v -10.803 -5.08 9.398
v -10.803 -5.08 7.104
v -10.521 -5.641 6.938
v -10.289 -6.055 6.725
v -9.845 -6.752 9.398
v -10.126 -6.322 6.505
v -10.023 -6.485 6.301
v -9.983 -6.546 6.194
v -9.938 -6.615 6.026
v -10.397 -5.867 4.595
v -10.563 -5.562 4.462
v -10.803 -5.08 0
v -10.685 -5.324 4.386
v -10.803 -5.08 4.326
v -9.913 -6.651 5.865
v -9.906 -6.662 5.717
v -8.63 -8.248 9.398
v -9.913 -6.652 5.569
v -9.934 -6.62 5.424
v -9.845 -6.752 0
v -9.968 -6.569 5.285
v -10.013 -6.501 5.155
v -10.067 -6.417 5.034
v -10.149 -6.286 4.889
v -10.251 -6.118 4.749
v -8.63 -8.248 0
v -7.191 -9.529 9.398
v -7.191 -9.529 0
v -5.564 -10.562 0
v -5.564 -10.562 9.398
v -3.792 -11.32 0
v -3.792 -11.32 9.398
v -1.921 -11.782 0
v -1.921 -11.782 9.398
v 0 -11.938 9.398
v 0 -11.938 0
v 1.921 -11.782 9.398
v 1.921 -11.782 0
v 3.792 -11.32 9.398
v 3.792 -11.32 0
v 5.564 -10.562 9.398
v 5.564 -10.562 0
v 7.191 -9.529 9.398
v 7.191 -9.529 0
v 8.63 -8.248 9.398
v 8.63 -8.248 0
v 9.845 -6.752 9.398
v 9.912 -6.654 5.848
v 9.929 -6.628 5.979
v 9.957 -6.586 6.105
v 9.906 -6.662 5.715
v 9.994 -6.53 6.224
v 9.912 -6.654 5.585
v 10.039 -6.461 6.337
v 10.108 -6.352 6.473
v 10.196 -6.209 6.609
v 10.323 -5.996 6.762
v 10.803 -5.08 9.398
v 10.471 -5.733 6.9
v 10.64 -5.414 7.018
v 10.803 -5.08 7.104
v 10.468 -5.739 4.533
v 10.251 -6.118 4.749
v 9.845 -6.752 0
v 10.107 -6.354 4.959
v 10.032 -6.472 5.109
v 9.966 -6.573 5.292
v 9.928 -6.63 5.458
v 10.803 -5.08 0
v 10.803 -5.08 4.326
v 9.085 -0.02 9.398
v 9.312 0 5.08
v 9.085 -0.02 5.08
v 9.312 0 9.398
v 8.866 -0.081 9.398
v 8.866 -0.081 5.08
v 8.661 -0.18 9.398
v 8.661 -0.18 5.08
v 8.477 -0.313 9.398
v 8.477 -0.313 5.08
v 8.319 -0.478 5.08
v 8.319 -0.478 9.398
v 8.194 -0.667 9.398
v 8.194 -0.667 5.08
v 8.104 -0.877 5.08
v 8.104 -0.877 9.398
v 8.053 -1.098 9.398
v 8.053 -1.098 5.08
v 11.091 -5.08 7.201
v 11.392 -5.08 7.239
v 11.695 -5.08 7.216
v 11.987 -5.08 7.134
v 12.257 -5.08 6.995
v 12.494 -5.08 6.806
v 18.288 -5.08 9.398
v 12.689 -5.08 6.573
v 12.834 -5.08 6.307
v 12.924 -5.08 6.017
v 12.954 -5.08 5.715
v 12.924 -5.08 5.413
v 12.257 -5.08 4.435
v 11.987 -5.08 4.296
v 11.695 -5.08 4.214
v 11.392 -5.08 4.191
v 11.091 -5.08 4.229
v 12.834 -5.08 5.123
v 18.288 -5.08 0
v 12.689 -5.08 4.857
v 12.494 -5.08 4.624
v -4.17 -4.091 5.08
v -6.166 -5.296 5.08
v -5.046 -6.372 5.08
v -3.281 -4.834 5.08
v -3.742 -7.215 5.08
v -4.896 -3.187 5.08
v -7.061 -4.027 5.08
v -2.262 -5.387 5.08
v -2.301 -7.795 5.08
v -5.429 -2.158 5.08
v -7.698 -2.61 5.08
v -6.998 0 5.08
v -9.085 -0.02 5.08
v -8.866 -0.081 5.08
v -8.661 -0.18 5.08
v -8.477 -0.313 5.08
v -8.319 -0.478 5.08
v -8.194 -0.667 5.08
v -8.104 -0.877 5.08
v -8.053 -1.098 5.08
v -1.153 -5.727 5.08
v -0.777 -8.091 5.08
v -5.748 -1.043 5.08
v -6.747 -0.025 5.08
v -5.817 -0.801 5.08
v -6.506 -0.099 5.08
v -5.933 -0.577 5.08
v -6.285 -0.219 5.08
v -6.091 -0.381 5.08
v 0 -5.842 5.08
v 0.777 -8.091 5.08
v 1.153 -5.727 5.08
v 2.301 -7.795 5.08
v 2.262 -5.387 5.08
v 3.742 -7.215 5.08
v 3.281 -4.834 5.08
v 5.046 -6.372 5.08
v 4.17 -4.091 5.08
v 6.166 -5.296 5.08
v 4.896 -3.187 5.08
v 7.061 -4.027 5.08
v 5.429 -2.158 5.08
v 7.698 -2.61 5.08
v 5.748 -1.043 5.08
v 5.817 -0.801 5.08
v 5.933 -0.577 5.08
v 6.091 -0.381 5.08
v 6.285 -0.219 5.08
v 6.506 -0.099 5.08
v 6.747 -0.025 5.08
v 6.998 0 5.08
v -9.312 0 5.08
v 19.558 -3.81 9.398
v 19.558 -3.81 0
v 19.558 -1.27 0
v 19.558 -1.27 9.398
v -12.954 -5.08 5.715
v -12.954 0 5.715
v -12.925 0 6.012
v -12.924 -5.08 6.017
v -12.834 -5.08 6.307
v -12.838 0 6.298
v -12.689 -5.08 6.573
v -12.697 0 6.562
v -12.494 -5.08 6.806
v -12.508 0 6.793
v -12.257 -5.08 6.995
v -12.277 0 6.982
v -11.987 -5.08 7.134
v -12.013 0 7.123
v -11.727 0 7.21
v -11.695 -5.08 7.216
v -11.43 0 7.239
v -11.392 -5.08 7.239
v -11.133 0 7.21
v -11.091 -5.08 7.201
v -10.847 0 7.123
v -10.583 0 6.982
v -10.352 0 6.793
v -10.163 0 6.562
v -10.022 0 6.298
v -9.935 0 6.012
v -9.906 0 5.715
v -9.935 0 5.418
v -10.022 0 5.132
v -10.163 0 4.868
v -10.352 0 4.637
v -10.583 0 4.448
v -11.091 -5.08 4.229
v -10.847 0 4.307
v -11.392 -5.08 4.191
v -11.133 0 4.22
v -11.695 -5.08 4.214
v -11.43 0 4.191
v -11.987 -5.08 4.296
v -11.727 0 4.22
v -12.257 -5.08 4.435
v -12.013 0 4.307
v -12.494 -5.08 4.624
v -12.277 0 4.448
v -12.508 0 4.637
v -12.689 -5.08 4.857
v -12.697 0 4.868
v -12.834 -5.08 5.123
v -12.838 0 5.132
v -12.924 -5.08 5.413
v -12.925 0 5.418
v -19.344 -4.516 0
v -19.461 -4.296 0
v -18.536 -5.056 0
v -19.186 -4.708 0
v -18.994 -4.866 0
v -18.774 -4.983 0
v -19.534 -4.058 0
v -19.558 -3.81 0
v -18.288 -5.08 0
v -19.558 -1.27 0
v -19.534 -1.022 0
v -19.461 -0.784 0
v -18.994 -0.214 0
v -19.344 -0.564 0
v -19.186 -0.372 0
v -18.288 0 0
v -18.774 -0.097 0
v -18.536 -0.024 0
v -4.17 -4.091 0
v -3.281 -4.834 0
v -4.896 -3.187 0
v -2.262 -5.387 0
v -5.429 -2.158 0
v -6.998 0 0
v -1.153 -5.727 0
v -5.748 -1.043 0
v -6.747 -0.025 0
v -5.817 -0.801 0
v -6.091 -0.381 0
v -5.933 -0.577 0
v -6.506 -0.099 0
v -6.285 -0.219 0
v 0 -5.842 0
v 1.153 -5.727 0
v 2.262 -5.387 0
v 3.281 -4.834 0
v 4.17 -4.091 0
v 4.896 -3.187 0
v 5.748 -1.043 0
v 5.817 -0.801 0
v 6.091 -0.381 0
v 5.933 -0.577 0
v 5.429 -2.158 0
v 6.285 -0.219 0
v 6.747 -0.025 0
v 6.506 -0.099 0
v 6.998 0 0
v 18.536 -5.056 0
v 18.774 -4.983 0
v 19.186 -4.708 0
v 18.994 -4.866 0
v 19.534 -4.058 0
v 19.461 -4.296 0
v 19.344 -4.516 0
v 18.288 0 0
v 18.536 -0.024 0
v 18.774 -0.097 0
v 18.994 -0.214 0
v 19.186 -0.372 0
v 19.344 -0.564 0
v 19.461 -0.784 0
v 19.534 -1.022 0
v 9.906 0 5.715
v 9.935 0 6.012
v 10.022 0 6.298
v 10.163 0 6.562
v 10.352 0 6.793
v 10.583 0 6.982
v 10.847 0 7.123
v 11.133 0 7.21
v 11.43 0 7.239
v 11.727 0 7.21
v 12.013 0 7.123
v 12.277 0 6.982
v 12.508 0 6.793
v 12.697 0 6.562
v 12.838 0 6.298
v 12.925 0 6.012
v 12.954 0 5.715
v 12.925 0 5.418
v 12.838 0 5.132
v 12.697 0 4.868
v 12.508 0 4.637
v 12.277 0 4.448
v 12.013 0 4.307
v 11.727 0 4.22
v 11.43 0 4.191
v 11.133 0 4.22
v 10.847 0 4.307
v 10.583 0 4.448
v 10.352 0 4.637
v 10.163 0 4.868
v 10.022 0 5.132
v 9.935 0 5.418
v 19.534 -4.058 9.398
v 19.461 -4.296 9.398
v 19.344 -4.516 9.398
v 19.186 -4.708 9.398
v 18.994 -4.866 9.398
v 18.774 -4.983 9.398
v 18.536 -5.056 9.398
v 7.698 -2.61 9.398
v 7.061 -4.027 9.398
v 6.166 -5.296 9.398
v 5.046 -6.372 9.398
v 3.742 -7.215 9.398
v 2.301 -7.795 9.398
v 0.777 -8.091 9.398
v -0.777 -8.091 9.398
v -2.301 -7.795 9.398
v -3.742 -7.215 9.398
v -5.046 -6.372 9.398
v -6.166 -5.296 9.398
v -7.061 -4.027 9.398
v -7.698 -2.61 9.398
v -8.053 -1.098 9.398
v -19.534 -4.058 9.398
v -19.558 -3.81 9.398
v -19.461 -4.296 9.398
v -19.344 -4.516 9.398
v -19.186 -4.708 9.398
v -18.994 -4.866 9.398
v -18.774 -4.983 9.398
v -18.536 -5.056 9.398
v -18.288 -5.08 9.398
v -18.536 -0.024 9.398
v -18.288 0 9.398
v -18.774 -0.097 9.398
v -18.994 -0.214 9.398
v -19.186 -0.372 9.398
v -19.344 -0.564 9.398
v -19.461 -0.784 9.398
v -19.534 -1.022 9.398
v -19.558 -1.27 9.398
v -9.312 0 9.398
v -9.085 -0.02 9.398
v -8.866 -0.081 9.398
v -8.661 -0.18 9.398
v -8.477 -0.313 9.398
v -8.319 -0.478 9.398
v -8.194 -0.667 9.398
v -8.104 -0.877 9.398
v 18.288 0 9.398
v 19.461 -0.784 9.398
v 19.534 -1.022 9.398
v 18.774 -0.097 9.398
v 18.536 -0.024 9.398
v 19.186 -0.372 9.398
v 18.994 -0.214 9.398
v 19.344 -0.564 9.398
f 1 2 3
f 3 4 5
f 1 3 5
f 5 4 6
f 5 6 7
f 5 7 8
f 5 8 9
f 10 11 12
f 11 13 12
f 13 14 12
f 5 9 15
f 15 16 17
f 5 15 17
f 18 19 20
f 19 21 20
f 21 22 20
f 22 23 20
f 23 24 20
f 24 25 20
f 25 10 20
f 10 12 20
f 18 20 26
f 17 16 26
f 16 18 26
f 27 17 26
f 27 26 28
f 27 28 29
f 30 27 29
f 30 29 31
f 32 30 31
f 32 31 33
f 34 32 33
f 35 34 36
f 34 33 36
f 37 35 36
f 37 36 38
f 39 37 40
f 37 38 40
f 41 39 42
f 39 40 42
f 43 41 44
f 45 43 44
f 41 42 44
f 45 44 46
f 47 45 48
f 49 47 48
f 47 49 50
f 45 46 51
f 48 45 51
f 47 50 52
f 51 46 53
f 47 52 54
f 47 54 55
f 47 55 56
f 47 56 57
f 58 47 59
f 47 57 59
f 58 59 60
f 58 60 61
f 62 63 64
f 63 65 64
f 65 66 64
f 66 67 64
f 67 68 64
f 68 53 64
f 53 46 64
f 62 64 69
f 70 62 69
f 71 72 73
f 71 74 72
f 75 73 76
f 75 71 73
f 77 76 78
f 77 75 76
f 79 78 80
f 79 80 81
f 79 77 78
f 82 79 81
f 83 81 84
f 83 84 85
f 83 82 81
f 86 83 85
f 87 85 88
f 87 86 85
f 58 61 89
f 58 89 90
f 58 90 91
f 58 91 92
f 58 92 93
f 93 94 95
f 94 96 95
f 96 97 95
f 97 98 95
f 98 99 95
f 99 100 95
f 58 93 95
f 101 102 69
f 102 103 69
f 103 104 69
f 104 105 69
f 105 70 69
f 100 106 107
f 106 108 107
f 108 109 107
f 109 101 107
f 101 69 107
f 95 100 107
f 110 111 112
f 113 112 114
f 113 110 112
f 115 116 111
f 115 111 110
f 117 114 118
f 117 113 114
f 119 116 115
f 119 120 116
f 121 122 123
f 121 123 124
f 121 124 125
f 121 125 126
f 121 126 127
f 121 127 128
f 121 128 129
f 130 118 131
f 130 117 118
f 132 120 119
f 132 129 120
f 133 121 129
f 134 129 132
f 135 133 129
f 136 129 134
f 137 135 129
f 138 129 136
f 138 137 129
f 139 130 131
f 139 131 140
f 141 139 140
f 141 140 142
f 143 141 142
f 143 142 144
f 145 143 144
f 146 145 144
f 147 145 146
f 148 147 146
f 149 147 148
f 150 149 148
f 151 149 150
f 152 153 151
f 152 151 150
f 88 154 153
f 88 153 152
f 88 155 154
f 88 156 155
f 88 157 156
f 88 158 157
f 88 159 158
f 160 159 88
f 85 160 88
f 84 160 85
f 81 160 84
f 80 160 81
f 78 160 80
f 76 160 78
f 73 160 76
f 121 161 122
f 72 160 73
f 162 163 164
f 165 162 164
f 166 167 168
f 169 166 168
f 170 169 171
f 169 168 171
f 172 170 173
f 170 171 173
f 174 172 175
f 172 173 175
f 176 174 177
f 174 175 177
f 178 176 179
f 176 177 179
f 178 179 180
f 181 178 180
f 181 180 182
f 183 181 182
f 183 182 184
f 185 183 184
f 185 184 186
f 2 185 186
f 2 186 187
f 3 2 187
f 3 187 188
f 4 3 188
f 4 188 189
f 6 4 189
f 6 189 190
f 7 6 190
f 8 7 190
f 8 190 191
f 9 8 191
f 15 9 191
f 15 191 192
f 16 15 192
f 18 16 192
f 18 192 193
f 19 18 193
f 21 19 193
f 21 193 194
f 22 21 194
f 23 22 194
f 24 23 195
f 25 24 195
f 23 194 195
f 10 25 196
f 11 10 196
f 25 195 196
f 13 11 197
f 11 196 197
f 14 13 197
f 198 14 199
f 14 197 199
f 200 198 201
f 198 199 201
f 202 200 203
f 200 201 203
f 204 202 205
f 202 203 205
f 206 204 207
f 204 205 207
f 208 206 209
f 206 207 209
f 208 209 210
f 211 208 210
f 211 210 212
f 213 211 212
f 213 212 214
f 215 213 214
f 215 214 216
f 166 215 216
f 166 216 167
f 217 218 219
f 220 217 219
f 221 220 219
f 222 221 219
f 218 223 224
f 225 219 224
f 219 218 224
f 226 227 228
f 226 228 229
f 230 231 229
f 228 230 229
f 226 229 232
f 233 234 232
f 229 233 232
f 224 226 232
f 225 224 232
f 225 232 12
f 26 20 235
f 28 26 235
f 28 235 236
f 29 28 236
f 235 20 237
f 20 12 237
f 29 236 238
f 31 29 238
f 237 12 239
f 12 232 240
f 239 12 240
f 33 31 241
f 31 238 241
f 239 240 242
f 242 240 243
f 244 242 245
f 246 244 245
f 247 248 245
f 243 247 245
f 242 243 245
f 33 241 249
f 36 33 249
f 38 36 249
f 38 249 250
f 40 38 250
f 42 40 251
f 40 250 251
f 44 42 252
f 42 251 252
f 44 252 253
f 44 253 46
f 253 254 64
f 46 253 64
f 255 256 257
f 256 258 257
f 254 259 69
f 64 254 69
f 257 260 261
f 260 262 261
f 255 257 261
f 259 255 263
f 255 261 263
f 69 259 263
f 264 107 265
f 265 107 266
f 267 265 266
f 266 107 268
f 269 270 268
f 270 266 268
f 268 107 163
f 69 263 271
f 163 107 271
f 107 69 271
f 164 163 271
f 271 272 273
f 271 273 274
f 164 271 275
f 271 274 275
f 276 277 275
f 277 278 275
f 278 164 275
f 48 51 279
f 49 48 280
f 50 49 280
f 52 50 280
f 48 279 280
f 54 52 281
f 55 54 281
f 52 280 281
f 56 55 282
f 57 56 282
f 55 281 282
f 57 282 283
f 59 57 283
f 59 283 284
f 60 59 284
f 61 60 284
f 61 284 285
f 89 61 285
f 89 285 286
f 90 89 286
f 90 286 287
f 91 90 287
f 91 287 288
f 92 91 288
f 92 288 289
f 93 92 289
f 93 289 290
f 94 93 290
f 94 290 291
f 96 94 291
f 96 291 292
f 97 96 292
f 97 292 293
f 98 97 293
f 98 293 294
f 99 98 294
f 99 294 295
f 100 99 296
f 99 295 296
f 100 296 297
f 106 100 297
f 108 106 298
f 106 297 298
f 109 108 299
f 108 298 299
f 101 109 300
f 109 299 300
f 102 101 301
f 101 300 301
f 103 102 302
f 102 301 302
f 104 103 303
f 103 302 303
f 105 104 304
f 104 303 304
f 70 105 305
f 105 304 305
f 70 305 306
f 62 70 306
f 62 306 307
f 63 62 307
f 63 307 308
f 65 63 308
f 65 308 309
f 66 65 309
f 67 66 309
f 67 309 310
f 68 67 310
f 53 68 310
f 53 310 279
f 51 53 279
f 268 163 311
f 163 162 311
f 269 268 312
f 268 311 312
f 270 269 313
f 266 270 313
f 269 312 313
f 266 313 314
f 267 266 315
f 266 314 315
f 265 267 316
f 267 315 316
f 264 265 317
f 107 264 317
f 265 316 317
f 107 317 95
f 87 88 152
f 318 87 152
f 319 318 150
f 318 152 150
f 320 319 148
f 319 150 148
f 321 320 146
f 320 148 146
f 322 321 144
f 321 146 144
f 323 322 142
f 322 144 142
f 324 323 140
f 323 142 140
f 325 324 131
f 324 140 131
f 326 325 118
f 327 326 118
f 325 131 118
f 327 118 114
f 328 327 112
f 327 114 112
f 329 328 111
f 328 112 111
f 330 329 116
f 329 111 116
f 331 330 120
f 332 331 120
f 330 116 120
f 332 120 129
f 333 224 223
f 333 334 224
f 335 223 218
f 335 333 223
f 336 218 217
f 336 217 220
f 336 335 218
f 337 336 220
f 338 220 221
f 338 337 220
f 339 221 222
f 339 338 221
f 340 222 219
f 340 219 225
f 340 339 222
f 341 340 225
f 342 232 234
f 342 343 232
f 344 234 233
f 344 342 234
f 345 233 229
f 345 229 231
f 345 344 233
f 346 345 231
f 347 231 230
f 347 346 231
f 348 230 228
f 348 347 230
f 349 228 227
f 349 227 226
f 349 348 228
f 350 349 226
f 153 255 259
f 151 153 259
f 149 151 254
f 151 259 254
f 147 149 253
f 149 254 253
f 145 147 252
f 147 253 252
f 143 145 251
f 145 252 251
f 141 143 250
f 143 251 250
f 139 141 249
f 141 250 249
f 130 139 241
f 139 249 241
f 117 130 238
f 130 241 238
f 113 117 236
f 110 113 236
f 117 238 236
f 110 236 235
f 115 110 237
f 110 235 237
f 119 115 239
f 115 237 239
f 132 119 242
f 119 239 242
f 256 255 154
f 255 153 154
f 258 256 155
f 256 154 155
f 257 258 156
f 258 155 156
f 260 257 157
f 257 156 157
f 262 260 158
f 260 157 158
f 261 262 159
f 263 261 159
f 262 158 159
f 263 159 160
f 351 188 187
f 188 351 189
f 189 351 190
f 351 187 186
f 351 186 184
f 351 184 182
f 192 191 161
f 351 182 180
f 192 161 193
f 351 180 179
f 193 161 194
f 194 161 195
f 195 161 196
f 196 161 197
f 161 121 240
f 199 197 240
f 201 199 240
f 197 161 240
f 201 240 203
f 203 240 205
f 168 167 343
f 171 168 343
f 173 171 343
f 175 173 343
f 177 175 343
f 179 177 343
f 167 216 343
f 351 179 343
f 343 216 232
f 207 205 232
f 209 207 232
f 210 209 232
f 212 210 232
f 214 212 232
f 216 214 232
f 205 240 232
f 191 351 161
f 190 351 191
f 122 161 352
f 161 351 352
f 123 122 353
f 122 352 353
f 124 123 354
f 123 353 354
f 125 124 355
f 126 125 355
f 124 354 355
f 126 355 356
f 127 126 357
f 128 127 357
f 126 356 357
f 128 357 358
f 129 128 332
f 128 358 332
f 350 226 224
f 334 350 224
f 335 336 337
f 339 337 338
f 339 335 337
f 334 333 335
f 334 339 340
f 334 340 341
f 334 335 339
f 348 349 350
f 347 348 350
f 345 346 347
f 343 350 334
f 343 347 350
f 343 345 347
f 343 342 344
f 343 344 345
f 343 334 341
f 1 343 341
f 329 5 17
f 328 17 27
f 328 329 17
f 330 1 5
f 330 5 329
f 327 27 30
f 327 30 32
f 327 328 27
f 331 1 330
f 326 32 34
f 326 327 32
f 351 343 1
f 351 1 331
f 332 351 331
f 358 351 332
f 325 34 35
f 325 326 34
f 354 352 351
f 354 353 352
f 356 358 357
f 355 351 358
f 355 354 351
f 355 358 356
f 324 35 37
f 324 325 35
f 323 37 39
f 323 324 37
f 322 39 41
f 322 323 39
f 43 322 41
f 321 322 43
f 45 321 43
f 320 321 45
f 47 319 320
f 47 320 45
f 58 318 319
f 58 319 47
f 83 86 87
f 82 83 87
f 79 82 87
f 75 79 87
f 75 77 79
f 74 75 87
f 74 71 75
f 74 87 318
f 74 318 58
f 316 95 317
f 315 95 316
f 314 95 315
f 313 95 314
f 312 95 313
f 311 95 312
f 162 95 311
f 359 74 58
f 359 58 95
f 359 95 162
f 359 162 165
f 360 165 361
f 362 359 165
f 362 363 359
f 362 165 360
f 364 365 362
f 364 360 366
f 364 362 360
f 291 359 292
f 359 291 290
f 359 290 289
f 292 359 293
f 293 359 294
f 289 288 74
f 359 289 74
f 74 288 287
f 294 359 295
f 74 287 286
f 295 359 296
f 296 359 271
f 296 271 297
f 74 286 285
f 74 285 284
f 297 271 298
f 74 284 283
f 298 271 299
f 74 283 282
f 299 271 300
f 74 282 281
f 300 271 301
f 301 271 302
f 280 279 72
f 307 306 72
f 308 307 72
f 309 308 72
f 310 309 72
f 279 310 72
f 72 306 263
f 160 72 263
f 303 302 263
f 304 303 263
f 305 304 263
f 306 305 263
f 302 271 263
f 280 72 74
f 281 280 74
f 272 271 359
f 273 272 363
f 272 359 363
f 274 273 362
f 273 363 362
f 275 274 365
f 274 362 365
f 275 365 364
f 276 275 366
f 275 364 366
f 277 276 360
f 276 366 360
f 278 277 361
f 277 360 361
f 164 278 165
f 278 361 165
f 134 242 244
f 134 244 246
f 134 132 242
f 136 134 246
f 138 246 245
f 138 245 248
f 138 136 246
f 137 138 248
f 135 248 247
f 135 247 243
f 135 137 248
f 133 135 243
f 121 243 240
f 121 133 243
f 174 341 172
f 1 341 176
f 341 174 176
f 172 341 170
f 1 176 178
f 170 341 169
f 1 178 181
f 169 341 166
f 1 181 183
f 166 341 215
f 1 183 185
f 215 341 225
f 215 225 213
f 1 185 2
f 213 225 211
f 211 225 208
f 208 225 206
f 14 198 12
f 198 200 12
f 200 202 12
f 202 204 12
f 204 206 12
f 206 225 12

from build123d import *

# Parameters (mm, degrees)
F1_DEPTH = 9.398
F2_DEPTH = 5.08
F3_R     = 1.524
F4_DEPTH = 6.6633576407
F5_R     = 1.27


with BuildPart() as f1:
    # F0 (on Top) → F1 (new body)
    with BuildSketch(Plane.XY):
        with BuildLine():
            ThreePointArc((-10.8032145216, -5.08), (-11.6508501612, -2.6026014909), (-11.938, 0))
            Line((-11.938, 0), (-19.558, 0))
            Line((-19.558, 0), (-19.558, -5.08))
            Line((-19.558, -5.08), (-10.8032145216, -5.08))
        make_face()
        with BuildLine():
            ThreePointArc((8.128, 0), (0, -8.128), (-8.128, 0))
            Line((-8.128, 0), (-11.938, 0))
            ThreePointArc((-11.938, 0), (-11.6508501612, -2.6026014909), (-10.8032145216, -5.08))
            ThreePointArc((-10.8032145216, -5.08), (0, -11.938), (10.8032145216, -5.08))
            ThreePointArc((10.8032145216, -5.08), (11.6508501612, -2.6026014909), (11.938, 0))
            Line((11.938, 0), (8.128, 0))
        make_face()
        with BuildLine():
            Line((19.558, 0), (11.938, 0))
            ThreePointArc((11.938, 0), (11.6508501612, -2.6026014909), (10.8032145216, -5.08))
            Line((10.8032145216, -5.08), (19.558, -5.08))
            Line((19.558, -5.08), (19.558, 0))
        make_face()
    extrude(amount=F1_DEPTH)

    # F0 (on Top) → F2 (join)
    with BuildSketch(Plane.XY):
        with BuildLine():
            ThreePointArc((5.842, 0), (0, -5.842), (-5.842, 0))
            Line((-5.842, 0), (-8.128, 0))
            ThreePointArc((-8.128, 0), (0, -8.128), (8.128, 0))
            Line((8.128, 0), (5.842, 0))
        make_face()
    extrude(amount=F2_DEPTH)

    # F3 (on face) → F4 (cut, through all)
    with BuildSketch(Plane(origin=(0, 0, 0), x_dir=(-1, 0, 0), z_dir=(0, 1, 0))):
        with Locations((-11.43, 5.715)):
            Circle(F3_R)
        with Locations((11.43, 5.715)):
            Circle(F3_R)
    extrude(amount=-F4_DEPTH, mode=Mode.SUBTRACT)

    # F5
    f5_edges = [f1.edges().sort_by_distance(p)[0] for p in [
        (5.842, 0, 2.54),
        (-5.842, 0, 2.54),
        (8.128, 0, 7.239),
        (-8.128, 0, 7.239),
        (19.558, 0, 4.699),
        (19.558, -5.08, 4.699),
        (-19.558, 0, 4.699),
        (-19.558, -5.08, 4.699),
    ]]
    fillet(f5_edges, radius=F5_R)


solid = f1.part
